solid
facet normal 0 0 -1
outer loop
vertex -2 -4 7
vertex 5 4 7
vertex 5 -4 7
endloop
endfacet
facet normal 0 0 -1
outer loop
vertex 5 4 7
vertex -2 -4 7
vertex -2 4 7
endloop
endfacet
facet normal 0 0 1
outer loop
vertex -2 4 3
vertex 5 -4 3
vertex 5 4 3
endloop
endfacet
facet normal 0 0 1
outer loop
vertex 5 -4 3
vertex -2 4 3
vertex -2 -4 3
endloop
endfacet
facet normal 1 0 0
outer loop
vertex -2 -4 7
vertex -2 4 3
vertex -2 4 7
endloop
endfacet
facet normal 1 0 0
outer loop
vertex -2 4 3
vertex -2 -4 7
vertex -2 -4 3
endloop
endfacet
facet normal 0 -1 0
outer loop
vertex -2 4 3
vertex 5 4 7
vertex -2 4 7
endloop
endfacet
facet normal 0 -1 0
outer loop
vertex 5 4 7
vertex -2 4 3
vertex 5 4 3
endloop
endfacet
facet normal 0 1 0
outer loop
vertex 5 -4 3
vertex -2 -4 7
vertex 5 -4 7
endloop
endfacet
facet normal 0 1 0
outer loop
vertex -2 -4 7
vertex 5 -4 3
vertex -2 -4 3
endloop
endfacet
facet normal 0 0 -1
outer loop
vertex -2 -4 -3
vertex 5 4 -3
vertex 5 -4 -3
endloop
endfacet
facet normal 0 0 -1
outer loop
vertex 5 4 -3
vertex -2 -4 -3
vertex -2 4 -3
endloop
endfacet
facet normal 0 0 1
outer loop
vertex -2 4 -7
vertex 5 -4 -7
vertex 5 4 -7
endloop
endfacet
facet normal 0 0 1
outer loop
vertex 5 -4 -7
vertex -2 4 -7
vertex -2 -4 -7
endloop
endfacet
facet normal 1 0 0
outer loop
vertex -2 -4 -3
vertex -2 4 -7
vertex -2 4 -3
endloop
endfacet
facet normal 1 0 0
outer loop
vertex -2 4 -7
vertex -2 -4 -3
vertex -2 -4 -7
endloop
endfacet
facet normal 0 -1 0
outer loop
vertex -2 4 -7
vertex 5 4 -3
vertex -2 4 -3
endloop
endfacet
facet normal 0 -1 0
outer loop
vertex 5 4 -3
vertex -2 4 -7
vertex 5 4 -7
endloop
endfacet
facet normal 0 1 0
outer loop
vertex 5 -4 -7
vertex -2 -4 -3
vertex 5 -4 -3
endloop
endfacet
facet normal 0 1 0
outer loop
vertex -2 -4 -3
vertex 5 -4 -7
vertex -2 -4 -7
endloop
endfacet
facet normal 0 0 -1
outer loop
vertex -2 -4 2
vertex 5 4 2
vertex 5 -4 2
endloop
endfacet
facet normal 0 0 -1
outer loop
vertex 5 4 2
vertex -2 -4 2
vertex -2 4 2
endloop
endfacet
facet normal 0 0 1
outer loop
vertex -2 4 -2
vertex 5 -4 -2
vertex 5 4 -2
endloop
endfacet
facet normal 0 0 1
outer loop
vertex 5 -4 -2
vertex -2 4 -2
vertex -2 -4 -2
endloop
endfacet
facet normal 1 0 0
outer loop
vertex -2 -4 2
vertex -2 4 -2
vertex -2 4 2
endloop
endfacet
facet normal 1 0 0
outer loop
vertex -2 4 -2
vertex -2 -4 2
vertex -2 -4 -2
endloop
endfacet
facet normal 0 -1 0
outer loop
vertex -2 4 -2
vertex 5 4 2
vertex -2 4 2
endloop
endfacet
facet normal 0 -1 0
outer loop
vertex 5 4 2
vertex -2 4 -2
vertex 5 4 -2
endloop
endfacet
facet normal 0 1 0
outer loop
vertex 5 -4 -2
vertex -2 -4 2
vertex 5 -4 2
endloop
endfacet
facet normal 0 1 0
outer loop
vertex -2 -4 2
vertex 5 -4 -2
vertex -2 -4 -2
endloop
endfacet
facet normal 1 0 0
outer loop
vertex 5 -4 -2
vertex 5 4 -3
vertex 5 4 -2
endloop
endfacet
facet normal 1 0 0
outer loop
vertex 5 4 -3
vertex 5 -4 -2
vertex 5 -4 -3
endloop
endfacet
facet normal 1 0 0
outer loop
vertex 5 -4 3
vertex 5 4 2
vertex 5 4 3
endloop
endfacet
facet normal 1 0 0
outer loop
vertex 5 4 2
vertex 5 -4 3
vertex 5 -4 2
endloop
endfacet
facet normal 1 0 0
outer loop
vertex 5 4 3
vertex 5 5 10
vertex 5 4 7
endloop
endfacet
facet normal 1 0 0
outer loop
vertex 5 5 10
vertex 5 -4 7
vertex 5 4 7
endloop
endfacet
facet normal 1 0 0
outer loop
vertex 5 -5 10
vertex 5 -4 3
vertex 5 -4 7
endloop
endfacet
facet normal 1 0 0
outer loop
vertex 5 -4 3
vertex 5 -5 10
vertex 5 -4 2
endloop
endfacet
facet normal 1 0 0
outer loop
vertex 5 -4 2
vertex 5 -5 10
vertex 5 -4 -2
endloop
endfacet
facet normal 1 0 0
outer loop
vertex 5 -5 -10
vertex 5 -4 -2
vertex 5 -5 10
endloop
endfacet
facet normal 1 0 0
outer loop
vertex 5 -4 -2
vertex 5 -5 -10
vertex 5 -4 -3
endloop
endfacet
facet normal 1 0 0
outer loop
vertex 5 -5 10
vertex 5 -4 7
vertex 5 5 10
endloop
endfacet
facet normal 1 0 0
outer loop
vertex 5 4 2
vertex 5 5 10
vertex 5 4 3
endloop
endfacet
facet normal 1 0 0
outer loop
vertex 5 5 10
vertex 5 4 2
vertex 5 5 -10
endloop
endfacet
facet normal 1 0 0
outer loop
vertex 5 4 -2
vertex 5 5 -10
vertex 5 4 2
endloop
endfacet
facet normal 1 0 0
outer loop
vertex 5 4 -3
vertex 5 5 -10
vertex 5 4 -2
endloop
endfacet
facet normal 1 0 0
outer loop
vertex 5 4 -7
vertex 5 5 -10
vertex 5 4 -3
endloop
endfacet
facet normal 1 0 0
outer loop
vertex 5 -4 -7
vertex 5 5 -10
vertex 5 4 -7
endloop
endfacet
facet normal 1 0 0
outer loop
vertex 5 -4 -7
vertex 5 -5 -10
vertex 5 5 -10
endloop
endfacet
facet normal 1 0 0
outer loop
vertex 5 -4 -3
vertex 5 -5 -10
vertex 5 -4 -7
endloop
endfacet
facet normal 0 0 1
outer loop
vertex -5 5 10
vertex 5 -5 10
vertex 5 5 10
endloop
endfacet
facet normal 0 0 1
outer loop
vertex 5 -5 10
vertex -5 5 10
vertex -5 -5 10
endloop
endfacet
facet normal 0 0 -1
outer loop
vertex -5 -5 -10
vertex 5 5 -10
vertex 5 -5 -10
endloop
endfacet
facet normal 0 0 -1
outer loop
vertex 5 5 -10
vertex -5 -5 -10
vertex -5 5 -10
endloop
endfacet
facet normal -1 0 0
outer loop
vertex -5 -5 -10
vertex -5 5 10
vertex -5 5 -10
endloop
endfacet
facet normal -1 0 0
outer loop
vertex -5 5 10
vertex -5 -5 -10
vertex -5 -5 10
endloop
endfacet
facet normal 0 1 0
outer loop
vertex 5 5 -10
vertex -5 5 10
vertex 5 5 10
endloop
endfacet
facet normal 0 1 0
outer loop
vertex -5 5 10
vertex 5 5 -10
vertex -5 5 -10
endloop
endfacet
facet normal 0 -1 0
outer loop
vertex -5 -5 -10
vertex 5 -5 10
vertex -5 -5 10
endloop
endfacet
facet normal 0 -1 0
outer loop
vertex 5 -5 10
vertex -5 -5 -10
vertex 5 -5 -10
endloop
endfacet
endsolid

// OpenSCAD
module Bookshelf_01(){
    difference(){
        color("#664433")
        cube([10,10,20],center=true);

        color("#ada192"){
        translate([2,0,5])
        cube([8,8,4],center=true);

        translate([2,0,-5])
        cube([8,8,4],center=true);


        translate([2,0,0])
        cube([8,8,4],center=true);

        translate([2,0,-5])
        cube([8,8,4],center=true);
        }
    }
}


Bookshelf_01();
